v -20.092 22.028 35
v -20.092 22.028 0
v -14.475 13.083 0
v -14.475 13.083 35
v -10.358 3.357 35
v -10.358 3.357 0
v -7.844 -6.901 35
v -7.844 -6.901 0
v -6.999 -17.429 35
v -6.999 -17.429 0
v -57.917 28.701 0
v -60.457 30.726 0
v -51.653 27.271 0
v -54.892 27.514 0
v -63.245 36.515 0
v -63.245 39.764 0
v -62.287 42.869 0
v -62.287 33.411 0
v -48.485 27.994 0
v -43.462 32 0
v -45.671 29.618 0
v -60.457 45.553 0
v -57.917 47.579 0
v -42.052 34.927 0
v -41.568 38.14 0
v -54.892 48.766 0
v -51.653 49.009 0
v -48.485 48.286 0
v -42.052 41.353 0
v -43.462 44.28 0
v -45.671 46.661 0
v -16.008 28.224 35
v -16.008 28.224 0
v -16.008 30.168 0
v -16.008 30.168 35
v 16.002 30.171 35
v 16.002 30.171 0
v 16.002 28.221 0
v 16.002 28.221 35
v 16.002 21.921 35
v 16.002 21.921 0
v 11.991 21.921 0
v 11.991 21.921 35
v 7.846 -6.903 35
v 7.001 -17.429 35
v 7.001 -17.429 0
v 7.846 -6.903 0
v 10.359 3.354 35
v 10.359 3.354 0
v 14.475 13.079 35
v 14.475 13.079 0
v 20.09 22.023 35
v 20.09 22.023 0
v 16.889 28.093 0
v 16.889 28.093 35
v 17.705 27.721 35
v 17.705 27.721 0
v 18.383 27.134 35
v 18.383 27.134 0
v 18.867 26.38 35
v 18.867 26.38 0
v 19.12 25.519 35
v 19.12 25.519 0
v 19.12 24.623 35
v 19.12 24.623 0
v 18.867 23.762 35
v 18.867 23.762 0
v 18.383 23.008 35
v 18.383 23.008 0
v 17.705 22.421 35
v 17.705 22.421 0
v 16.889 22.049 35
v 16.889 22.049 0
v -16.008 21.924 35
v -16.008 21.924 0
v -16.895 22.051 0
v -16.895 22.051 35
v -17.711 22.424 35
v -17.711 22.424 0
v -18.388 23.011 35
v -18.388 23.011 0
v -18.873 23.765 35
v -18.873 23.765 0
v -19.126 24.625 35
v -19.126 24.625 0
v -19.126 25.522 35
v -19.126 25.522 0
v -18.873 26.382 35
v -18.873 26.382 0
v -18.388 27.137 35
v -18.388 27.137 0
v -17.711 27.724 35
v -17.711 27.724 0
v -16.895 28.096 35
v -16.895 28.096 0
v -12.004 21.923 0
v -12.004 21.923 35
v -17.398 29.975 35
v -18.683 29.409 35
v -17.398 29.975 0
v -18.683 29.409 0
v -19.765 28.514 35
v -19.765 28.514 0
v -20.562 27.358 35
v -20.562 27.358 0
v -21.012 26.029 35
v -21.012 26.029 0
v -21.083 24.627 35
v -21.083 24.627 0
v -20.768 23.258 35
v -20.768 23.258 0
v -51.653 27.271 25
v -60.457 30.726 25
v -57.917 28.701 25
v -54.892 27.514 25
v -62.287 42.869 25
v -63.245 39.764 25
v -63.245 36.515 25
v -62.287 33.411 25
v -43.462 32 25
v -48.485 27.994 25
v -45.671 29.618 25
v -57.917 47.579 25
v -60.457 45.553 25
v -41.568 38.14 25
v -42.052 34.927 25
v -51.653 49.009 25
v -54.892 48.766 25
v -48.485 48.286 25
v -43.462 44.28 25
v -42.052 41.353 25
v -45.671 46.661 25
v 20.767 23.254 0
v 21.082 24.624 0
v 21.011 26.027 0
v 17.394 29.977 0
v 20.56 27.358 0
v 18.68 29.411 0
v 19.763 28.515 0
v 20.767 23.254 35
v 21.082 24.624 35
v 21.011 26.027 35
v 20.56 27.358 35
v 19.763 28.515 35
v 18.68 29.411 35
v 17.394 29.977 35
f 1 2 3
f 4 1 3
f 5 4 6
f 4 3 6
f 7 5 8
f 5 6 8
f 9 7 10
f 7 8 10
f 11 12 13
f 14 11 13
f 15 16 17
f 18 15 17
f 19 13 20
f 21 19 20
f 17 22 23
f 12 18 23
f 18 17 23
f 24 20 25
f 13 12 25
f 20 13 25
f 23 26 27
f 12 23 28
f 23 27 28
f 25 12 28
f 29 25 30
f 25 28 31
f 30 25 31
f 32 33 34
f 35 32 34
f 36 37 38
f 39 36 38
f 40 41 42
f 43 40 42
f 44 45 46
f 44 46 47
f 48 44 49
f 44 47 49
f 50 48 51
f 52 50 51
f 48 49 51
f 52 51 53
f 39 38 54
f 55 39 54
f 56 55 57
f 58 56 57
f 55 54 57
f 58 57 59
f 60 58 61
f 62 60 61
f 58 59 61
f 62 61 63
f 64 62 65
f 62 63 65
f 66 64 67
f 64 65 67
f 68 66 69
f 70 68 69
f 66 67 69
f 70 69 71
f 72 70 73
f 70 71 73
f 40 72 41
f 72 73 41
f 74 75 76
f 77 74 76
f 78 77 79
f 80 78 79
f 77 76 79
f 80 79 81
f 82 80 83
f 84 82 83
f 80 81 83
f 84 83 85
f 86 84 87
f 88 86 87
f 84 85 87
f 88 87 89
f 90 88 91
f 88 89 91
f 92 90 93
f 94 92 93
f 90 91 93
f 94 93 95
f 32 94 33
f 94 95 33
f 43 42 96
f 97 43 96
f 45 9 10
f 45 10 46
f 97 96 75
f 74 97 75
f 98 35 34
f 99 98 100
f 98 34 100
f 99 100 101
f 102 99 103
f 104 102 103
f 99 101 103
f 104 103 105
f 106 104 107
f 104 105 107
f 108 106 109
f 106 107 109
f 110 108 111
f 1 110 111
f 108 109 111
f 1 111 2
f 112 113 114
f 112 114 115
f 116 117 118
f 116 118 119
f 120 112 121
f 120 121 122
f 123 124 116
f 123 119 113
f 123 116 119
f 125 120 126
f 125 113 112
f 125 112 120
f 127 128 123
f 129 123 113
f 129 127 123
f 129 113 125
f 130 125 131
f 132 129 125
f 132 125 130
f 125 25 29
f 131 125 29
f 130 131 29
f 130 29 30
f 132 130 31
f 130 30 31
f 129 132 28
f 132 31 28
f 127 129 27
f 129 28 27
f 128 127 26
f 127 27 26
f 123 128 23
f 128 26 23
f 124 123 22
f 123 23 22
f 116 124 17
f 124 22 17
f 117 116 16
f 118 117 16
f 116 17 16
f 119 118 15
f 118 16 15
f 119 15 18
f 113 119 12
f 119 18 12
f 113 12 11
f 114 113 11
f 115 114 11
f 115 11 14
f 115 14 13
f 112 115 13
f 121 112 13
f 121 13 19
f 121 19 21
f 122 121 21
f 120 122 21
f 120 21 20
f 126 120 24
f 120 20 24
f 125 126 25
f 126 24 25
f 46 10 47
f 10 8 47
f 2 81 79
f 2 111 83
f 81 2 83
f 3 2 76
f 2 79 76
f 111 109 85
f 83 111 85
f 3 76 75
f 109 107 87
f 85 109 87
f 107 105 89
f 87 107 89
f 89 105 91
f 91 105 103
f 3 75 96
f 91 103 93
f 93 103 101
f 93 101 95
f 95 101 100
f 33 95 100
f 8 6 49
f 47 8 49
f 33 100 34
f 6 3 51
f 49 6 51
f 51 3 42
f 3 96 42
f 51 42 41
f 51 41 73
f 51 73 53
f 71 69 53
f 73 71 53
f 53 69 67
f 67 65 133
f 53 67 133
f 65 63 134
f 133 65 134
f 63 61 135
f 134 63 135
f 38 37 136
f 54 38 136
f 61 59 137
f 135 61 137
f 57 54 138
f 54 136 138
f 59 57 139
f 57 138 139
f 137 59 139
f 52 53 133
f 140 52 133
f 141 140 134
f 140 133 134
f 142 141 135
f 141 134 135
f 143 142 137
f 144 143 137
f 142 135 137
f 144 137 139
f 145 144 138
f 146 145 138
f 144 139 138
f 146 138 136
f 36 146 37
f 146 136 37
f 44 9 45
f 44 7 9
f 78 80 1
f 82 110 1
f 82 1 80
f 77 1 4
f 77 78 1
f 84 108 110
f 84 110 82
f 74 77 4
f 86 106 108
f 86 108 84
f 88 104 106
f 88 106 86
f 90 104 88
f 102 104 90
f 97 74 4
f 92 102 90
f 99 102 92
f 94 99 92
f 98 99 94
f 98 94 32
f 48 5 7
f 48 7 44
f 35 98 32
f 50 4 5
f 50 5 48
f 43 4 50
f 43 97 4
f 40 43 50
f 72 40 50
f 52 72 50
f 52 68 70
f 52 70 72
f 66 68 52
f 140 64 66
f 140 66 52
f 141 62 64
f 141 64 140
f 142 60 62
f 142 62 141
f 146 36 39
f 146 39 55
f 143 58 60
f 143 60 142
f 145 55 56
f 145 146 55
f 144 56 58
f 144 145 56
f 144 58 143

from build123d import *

# Parameters (mm, degrees)
F1_DEPTH = 35
F2_R     = 10.899382
F3_DEPTH = 25


with BuildPart() as f1:
    # F0 (on Top) → F1 (new body)
    with BuildSketch(Plane.XY):
        with BuildLine():
            Line((-6.998822, -17.428958), (0.001178, -17.428958))
            Line((0.001178, -17.428958), (7.001178, -17.428958))
            ThreePointArc((7.001178, -17.428958), (10.358855, 3.354193), (20.090249, 22.022704))
            ThreePointArc((20.090249, 22.022704), (16.065738, 19.971774), (11.991179, 21.921381))
            Line((11.991179, 21.921381), (-12.003953, 21.923408))
            ThreePointArc((-12.003953, 21.923408), (-16.073704, 19.979499), (-20.091832, 22.027985))
            ThreePointArc((-20.091832, 22.027985), (-10.357536, 3.357319), (-6.998822, -17.428958))
        make_face()
        with BuildLine():
            ThreePointArc((-16.007834, 30.168419), (-20.561561, 27.358318), (-20.091832, 22.027985))
            ThreePointArc((-20.091832, 22.027985), (-16.073704, 19.979499), (-12.003953, 21.923408))
            Line((-12.003953, 21.923408), (-16.007834, 21.923746))
            ThreePointArc((-16.007834, 21.923746), (-19.157834, 25.073746), (-16.007834, 28.223746))
            Line((-16.007834, 28.223746), (-16.007834, 30.168419))
        make_face()
        with BuildLine():
            ThreePointArc((11.991179, 21.921381), (16.065738, 19.971774), (20.090249, 22.022704))
            ThreePointArc((20.090249, 22.022704), (20.56002, 27.358081), (16.001944, 30.170709))
            Line((16.001944, 30.170709), (16.001944, 28.221042))
            ThreePointArc((16.001944, 28.221042), (19.151944, 25.071042), (16.001944, 21.921042))
            Line((16.001944, 21.921042), (11.991179, 21.921381))
        make_face()
    extrude(amount=F1_DEPTH)


with BuildPart() as f3:
    # F2 (on Top) → F3 (new body)
    with BuildSketch(Plane.XY):
        with Locations((-52.467067, 38.139902)):
            Circle(F2_R)
    extrude(amount=F3_DEPTH)


solid = Compound([f1.part, f3.part])
